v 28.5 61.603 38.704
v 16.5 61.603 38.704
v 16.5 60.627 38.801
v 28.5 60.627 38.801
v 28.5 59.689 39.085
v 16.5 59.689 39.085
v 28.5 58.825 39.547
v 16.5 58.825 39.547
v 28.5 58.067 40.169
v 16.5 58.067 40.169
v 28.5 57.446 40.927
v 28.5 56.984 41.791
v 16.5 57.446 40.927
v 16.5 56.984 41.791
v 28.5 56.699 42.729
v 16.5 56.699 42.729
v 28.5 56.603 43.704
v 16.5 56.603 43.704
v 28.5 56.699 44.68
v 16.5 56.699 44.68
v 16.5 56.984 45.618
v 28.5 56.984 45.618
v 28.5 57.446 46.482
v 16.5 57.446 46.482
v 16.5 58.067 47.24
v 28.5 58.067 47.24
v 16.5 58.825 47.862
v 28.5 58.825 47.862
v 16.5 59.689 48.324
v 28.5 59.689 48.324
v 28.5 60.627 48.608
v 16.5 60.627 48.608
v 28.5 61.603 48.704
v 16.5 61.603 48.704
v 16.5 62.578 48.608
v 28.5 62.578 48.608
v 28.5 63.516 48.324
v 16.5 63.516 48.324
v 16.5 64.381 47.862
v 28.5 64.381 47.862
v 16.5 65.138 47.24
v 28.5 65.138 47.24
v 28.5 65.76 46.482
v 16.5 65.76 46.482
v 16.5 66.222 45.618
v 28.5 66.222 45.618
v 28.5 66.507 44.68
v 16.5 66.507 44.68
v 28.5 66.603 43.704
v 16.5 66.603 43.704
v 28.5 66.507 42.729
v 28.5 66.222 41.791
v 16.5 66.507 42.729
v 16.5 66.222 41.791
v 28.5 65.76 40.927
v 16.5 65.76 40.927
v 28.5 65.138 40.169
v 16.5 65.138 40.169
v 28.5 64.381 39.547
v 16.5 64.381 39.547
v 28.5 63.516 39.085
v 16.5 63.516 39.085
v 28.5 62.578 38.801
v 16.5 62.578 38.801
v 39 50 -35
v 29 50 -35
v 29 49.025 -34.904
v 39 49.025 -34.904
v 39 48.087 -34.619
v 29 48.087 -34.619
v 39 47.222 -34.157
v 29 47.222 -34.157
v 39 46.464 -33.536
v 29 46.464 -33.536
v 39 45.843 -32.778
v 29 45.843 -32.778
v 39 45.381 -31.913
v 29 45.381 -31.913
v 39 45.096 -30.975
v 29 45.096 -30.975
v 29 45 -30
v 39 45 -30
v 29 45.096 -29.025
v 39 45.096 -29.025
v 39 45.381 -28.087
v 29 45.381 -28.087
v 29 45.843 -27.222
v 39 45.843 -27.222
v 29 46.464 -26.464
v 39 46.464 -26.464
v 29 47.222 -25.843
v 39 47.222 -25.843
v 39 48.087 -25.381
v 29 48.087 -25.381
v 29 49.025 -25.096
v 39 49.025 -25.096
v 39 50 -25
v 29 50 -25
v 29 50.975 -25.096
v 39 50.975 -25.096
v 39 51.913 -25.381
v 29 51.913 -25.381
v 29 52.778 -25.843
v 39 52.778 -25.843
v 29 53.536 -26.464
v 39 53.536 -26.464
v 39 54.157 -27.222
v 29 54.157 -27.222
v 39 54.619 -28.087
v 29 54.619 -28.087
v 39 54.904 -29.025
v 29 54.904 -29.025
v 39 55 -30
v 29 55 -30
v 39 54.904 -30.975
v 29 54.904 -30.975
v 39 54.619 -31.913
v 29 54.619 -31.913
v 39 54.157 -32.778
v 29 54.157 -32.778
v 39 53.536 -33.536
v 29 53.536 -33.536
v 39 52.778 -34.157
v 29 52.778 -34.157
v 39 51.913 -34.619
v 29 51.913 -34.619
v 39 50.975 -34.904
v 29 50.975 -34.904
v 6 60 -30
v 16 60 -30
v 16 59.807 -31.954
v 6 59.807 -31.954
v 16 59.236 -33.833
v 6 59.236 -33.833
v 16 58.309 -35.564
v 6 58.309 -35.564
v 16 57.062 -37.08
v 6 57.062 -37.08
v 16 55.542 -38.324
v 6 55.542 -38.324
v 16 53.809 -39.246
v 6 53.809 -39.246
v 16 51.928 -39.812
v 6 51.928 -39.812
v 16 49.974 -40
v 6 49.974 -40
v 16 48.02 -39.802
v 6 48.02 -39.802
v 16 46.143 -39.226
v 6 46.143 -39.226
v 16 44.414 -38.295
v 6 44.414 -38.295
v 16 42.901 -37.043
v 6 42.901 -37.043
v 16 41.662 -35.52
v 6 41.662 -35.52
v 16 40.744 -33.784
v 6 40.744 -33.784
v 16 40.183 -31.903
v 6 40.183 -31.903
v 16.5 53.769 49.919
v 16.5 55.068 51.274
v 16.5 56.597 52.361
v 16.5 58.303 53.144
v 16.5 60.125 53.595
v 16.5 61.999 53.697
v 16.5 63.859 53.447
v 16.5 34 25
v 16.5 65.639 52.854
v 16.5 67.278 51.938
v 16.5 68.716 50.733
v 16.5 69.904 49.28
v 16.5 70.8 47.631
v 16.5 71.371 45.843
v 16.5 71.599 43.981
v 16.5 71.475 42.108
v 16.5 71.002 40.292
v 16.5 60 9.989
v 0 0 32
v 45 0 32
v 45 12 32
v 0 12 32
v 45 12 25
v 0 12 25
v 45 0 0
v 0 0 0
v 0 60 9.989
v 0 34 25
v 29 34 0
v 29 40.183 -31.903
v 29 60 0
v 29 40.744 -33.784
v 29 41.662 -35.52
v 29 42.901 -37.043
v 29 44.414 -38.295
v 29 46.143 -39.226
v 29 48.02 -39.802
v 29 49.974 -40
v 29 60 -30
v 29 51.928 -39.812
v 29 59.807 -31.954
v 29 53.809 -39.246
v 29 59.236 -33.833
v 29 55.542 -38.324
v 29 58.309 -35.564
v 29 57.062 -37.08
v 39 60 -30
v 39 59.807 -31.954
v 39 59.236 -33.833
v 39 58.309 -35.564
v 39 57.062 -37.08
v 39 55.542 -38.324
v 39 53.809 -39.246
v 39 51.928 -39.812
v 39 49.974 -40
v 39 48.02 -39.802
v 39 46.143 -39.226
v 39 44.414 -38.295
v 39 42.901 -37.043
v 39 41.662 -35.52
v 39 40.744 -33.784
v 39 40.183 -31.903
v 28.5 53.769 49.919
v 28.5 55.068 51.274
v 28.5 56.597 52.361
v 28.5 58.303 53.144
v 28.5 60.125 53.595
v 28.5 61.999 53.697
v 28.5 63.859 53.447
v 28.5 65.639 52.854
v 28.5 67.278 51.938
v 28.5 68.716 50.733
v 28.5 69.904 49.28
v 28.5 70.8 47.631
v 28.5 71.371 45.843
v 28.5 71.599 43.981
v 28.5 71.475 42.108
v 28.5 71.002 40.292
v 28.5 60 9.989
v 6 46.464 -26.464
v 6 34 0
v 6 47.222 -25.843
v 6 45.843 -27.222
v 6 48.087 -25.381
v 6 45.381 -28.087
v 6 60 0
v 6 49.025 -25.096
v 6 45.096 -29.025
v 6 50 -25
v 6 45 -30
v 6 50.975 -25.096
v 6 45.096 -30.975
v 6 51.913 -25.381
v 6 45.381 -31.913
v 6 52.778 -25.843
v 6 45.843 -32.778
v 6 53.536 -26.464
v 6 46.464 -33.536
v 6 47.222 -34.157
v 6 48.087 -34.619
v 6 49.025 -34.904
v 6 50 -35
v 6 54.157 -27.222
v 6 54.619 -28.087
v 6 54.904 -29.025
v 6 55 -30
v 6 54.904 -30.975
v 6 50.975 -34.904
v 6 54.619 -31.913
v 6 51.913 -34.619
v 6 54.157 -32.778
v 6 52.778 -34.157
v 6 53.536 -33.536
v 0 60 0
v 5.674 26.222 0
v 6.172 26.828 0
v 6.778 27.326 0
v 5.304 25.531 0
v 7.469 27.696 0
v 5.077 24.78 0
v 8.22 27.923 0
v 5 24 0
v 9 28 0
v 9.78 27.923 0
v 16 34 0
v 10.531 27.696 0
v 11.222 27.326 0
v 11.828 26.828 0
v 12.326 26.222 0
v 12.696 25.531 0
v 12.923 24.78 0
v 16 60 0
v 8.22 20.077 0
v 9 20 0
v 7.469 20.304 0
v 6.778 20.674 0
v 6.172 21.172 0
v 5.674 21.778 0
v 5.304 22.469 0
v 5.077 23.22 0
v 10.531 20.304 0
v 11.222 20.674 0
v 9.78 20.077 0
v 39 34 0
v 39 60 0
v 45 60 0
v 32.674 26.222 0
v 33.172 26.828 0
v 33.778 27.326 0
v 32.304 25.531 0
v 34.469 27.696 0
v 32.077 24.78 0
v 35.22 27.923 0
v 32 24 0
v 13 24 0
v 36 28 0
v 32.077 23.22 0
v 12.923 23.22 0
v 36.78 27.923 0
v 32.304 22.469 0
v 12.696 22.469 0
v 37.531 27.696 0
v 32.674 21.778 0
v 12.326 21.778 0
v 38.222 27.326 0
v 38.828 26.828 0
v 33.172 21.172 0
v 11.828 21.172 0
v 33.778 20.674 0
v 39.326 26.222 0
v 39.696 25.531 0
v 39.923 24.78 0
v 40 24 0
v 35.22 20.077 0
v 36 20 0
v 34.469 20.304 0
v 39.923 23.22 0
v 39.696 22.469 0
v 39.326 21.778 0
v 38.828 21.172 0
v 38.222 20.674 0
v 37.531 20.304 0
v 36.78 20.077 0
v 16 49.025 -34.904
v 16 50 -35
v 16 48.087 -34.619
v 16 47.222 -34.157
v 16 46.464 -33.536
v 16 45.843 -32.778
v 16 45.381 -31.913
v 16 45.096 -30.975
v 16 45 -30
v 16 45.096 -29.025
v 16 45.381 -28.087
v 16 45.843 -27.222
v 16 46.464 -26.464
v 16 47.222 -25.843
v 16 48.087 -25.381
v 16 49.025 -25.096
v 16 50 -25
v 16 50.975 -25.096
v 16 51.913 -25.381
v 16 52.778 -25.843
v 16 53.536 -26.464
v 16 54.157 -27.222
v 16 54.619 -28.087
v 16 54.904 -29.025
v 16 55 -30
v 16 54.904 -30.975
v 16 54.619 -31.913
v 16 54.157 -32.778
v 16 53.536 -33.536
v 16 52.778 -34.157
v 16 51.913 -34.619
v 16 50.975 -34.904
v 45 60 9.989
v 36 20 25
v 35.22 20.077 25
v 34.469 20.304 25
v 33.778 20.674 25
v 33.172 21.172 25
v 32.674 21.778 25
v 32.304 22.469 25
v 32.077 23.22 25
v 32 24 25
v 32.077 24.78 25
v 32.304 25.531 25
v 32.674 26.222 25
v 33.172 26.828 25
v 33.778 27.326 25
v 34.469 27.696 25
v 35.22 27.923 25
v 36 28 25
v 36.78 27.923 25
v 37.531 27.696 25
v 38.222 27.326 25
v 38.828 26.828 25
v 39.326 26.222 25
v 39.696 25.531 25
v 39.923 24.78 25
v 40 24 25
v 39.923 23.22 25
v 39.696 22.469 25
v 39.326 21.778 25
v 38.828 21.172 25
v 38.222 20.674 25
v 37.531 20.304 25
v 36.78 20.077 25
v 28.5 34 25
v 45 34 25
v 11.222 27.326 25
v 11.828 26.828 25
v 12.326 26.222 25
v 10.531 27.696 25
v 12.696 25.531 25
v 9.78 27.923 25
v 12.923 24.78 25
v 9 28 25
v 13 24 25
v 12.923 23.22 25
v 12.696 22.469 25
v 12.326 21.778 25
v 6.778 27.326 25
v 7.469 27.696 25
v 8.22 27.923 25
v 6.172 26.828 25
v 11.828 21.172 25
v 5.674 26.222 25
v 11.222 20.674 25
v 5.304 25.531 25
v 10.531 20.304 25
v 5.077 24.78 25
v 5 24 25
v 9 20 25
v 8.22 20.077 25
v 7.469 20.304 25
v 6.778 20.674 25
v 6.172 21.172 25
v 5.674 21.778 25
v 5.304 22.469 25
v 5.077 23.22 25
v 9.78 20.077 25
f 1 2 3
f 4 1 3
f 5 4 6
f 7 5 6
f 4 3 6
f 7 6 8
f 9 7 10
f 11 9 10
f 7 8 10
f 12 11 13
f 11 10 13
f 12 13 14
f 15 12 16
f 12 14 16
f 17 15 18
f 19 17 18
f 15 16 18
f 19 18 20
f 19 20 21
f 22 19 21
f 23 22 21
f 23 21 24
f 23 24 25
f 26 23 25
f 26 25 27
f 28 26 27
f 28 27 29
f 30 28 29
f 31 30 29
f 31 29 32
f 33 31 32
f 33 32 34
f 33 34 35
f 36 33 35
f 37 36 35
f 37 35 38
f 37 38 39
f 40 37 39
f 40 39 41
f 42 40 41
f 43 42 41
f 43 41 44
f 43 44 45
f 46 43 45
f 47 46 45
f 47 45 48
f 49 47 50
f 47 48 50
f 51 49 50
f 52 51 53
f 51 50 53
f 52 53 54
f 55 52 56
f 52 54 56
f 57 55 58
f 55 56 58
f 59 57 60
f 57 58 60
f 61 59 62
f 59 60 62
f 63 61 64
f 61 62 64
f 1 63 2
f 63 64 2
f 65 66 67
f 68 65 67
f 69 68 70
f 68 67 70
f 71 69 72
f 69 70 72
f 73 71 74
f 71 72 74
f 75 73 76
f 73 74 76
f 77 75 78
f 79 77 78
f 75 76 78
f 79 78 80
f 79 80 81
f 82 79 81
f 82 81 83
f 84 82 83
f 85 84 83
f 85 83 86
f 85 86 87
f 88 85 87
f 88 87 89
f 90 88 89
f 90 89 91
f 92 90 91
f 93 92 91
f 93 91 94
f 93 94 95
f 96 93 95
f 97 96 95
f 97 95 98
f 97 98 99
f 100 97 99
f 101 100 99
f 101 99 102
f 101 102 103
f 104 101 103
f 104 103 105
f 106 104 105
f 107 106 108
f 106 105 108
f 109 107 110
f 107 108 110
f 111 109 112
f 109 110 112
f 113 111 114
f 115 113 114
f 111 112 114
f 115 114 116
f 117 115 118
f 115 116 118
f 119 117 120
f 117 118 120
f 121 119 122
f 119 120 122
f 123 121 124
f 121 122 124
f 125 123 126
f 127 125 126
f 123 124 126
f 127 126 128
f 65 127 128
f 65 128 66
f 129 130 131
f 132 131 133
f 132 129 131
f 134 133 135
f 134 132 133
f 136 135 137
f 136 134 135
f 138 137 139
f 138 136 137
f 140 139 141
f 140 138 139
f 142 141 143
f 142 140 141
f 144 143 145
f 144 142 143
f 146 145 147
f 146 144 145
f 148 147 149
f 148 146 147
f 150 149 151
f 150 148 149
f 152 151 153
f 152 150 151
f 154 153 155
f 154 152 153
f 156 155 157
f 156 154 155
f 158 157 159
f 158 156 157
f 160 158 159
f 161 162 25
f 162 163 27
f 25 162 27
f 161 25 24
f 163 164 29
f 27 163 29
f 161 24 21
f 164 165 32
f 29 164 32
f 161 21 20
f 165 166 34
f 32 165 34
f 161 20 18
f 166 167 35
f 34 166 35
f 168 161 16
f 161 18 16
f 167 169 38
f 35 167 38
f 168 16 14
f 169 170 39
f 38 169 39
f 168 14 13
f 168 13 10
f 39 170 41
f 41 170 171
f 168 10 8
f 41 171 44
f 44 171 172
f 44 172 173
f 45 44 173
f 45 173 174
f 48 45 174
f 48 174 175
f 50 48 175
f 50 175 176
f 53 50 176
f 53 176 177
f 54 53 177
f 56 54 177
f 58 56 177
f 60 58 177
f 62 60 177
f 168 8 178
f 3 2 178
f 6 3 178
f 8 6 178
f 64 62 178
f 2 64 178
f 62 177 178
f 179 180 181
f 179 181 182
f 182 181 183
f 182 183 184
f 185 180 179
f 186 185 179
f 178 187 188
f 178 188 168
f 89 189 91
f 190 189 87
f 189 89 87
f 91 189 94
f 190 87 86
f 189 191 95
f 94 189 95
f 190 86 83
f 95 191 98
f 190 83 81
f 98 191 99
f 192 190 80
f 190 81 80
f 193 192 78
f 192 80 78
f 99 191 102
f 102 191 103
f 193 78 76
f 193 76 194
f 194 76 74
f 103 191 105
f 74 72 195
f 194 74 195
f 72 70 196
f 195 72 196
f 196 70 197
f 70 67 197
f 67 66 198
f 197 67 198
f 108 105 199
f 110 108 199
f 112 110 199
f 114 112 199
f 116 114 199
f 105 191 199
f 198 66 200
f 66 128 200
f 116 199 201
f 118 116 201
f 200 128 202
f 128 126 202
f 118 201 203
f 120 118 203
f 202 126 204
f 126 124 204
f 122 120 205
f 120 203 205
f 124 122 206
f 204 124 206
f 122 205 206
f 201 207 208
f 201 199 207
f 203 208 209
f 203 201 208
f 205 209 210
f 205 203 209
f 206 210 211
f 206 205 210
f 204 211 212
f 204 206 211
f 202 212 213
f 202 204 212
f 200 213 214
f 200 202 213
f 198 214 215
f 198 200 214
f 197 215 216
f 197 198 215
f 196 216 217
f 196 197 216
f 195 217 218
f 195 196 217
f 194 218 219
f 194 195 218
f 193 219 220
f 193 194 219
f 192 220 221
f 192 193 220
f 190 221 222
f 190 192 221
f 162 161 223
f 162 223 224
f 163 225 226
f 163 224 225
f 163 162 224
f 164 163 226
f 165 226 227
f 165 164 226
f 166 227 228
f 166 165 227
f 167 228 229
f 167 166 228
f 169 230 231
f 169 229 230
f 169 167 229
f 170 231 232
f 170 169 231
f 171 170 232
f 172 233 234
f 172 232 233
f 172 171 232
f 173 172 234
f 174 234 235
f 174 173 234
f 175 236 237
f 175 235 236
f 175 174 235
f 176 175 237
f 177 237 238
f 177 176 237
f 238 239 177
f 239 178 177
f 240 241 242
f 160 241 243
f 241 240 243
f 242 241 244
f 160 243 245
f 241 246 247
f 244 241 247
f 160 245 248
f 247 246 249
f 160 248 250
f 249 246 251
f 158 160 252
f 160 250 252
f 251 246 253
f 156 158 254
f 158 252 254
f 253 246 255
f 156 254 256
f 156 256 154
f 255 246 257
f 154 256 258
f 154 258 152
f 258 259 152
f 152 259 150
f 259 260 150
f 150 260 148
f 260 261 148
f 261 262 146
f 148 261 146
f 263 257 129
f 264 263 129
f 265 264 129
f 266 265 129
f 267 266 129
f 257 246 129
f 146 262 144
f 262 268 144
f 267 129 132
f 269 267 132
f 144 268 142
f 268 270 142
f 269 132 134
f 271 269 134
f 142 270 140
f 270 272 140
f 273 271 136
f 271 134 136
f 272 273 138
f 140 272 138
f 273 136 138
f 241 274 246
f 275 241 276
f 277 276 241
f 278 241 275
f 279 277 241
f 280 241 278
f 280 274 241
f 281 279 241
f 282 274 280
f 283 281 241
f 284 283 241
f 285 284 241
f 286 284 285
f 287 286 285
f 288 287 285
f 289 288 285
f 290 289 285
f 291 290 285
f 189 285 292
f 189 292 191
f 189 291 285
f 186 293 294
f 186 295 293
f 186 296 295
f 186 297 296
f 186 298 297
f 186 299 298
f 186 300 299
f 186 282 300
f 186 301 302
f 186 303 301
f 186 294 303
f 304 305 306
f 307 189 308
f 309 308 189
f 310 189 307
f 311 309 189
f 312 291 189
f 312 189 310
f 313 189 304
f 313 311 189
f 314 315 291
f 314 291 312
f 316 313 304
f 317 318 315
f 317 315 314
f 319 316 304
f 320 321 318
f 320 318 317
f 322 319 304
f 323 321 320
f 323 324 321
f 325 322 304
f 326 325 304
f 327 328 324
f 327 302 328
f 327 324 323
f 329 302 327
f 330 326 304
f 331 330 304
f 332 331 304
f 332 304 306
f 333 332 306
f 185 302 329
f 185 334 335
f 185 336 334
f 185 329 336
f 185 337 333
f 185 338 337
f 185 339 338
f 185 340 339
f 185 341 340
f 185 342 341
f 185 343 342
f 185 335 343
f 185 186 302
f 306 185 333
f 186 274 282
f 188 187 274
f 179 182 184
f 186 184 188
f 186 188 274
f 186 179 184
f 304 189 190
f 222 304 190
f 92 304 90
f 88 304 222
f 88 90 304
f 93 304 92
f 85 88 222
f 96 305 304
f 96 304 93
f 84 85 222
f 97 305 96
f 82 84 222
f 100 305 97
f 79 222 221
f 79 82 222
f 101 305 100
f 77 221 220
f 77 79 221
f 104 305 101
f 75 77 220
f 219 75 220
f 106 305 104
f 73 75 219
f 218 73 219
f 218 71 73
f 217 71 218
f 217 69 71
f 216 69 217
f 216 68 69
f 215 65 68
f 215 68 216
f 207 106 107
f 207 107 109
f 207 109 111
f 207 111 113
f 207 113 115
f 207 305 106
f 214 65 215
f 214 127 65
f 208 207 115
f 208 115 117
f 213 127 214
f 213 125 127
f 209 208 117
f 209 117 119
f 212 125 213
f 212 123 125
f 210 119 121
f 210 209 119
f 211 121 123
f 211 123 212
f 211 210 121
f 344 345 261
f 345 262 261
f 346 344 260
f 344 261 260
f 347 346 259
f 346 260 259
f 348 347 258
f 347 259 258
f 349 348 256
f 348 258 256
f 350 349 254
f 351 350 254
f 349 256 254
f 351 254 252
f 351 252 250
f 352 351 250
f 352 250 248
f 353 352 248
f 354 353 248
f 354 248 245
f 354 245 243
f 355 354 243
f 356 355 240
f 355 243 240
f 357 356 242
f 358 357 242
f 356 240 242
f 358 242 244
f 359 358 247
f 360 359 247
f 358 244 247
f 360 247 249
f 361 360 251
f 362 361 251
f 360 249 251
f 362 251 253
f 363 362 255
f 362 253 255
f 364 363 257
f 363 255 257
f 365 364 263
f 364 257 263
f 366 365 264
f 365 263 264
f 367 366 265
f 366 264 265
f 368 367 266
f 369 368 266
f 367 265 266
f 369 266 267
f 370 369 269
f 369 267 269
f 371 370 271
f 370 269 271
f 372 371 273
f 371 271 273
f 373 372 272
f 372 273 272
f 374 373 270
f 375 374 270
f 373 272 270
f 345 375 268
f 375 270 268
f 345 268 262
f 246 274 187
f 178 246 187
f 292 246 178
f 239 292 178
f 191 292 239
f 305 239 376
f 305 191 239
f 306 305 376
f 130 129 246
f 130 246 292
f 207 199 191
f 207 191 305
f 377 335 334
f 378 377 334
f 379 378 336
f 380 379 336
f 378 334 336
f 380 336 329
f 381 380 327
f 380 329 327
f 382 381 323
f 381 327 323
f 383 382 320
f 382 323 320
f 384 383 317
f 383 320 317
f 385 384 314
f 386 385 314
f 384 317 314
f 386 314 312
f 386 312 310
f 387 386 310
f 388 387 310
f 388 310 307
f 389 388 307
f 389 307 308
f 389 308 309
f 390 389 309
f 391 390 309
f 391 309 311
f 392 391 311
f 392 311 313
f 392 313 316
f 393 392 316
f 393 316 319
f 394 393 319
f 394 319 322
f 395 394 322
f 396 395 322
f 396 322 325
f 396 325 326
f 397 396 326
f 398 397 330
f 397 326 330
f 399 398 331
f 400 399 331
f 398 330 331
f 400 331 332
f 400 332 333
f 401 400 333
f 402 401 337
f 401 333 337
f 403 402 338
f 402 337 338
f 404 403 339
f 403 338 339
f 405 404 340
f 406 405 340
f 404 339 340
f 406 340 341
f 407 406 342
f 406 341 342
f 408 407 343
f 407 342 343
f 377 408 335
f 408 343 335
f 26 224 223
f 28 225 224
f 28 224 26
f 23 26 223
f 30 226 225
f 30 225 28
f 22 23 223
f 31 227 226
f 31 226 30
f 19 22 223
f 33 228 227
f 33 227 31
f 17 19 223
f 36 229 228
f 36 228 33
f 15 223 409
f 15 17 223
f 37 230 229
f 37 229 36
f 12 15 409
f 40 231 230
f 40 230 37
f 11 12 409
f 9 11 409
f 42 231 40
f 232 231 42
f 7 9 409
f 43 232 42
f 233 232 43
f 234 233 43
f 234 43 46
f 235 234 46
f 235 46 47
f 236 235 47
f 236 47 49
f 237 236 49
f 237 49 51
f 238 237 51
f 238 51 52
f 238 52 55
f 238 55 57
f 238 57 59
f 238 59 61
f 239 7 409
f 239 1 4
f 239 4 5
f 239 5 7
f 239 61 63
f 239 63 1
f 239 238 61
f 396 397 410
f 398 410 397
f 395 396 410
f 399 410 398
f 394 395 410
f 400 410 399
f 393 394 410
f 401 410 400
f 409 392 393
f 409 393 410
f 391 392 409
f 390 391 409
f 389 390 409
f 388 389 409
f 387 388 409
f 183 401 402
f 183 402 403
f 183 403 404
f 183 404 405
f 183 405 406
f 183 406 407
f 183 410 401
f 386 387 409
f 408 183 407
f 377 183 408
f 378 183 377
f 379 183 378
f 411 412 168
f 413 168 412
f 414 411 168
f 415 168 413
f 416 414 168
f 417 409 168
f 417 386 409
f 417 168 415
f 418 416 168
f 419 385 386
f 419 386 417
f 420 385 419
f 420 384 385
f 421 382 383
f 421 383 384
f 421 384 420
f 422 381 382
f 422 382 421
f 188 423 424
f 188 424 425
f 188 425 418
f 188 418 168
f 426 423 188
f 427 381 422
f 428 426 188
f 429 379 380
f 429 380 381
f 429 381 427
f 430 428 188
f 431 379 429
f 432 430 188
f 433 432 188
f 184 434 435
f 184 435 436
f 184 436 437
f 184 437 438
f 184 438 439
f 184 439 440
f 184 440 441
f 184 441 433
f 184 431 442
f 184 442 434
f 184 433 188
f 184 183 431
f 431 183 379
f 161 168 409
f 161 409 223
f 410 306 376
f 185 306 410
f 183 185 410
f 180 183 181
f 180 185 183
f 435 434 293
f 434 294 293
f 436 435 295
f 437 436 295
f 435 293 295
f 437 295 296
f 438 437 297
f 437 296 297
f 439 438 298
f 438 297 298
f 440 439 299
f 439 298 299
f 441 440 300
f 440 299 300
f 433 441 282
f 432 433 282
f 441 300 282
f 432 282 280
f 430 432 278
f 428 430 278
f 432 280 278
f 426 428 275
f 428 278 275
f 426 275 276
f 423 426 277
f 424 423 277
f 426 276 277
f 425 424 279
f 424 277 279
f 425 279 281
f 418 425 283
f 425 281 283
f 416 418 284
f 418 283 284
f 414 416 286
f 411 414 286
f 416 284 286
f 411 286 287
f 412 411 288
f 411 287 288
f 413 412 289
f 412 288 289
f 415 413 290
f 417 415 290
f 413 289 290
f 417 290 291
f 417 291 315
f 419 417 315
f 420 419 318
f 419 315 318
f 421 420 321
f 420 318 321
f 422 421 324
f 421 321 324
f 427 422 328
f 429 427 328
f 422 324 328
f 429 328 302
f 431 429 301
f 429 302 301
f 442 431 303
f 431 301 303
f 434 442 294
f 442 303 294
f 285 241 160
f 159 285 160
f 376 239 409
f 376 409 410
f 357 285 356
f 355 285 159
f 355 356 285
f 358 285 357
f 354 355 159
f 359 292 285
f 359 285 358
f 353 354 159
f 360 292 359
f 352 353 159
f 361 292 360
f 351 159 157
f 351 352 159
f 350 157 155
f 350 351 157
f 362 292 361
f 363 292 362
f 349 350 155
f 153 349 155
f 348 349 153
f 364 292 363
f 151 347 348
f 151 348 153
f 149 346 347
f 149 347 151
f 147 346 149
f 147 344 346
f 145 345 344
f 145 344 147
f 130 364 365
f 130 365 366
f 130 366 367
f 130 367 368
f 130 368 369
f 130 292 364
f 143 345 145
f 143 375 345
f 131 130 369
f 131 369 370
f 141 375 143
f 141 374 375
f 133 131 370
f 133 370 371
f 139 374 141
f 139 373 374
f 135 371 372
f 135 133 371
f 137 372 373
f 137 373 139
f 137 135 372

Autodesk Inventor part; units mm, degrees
ref_plane "YZ Plane" through (0, 0, 0) normal (1, 0, 0) x (0, 1, 0)
ref_plane "XZ Plane" through (0, 0, 0) normal (0, 1, 0) x (-1, 0, 0)
ref_plane "XY Plane" through (0, 0, 0) normal (0, 0, 1) x (1, 0, 0)
sketch "Szkic1" plane through (0, 0, 0) normal (0, 1, 0) x (-1, 0, 0)
  line L0 (0, 0) -> (-45, 0)
  line L1 (-45, 0) -> (-45, 32)
  line L2 (-45, 32) -> (0, 32)
  line L3 (0, 32) -> (0, 0)
  dimension "d0" = 45
  dimension "d1" = 32
extrude "Wyciągnięcie proste1" add sketch "Szkic1" along normal blind 12
sketch "Szkic2" plane through (0, 12, 0) normal (0, 1, 0) x (1, 0, 0)
  line L0 (45, 0) -> (0, 0) projected
  line L1 (45, -32) -> (45, 0) projected
  line L2 (0, 0) -> (45, 0)
  line L3 (45, 0) -> (45, -25)
  line L4 (45, -25) -> (0, -25)
  line L5 (0, -25) -> (0, 0)
extrude "Wyciągnięcie proste2" add sketch "Szkic2" along normal blind 48
sketch "Szkic3" plane through (0, 12, 25) normal (0, 0, 1) x (1, 0, 0)
  point P0 (0, -12)
  point P1 (9, 12)
  point P2 (36, 12)
hole "Otwór1" at (9, 24, 25) at (36, 24, 25) direction (0, 0, -1) diameter 8 end through all
chamfer "Faza1" distance 26 angle 30 1 edges at (22.5, 60, 25) measured on face at (26.3804, 49.1806, 25)
sketch "Szkic4" plane through (0, 60, 0) normal (0, 1, 0) x (1, 0, 0)
  point P0 (0, 0)
ref_plane "Płaszczyzna konstrukcyjna1" through (22.5, 0, 32) normal (1, 0, 0) x (0, 0, -1)
sketch "Szkic5" plane through (22.5, 0, 32) normal (1, 0, 0) x (0, 0, -1)
  circle A0 centre (-11.7045, 61.6029) radius 10
  line L0 (7, 34) -> (22.0111, 60) projected
  line L1 (22.0111, 60) -> (-8.2916, 71.0025)
  line L2 (7, 12) -> (7, 34) projected
  line L3 (7, 34) -> (-17.9194, 53.7687)
  point P0 (32, 0)
  dimension "d16" = 20
  dimension "d17" = 30
extrude "Wyciągnięcie proste3" add sketch "Szkic5" along normal mid plane 12
sketch "Szkic6" plane through (28.5, 0, 32) normal (1, 0, 0) x (0, 0, -1)
  arc A0 (-8.2916, 71.0025) -> (-17.9194, 53.7687) centre (-11.7045, 61.6029) ccw projected
  point P0 (32, 0)
hole "Otwór2" at (28.5, 61.6029, 43.7045) direction (-1, 0, 0) diameter 10 end through all
sketch "Szkic7" plane through (28.5, 0, 32) normal (1, 0, 0) x (0, 0, -1)
  point P0 (32, 0)
sketch "Szkic8" plane through (22.5, 0, 32) normal (1, 0, 0) x (0, 0, -1)
  circle A0 centre (62, 50) radius 10
  line L0 (32, 0) -> (32, 60) projected
  line L1 (32, 60) -> (62, 60)
  line L2 (32, 34) -> (63.9026, 40.1827)
  dimension "d27" = 20
  dimension "d28" = 30
  dimension "d30" = 26
extrude "Wyciągnięcie proste4" add sketch "Szkic8" along normal mid plane 33
sketch "Szkic9" plane through (22.5, 0, 32) normal (1, 0, 0) x (0, 0, -1)
  arc A0 (63.9026, 40.1827) -> (62, 60) centre (62, 50) ccw projected
  line L0 (32, 60) -> (22.0111, 60) projected
  line L1 (62, 60) -> (32, 60)
  line L2 (32, 60) -> (32, 34)
  line L3 (32, 0) -> (32, 60) projected
  line L4 (32, 34) -> (63.9026, 40.1827) projected
  line L5 (62, 60) -> (32, 60) projected
  arc A1 (63.9026, 40.1827) -> (62, 60) centre (62.5165, 50.0496) ccw
extrude "Wyciągnięcie proste5" cut sketch "Szkic9" along normal mid plane 13 contours L4 L2 L1 A0
sketch "Szkic10" plane through (39, 0, 32) normal (1, 0, 0) x (0, 0, -1)
  point P0 (32, 0)
sketch "Szkic11" plane through (39, 0, 32) normal (1, 0, 0) x (0, 0, -1)
  arc A0 (63.9026, 40.1827) -> (62, 60) centre (62, 50) ccw projected
  point P0 (32, 0)
hole "Otwór3" at (39, 50, -30) direction (-1, 0, 0) diameter 10 end through all
